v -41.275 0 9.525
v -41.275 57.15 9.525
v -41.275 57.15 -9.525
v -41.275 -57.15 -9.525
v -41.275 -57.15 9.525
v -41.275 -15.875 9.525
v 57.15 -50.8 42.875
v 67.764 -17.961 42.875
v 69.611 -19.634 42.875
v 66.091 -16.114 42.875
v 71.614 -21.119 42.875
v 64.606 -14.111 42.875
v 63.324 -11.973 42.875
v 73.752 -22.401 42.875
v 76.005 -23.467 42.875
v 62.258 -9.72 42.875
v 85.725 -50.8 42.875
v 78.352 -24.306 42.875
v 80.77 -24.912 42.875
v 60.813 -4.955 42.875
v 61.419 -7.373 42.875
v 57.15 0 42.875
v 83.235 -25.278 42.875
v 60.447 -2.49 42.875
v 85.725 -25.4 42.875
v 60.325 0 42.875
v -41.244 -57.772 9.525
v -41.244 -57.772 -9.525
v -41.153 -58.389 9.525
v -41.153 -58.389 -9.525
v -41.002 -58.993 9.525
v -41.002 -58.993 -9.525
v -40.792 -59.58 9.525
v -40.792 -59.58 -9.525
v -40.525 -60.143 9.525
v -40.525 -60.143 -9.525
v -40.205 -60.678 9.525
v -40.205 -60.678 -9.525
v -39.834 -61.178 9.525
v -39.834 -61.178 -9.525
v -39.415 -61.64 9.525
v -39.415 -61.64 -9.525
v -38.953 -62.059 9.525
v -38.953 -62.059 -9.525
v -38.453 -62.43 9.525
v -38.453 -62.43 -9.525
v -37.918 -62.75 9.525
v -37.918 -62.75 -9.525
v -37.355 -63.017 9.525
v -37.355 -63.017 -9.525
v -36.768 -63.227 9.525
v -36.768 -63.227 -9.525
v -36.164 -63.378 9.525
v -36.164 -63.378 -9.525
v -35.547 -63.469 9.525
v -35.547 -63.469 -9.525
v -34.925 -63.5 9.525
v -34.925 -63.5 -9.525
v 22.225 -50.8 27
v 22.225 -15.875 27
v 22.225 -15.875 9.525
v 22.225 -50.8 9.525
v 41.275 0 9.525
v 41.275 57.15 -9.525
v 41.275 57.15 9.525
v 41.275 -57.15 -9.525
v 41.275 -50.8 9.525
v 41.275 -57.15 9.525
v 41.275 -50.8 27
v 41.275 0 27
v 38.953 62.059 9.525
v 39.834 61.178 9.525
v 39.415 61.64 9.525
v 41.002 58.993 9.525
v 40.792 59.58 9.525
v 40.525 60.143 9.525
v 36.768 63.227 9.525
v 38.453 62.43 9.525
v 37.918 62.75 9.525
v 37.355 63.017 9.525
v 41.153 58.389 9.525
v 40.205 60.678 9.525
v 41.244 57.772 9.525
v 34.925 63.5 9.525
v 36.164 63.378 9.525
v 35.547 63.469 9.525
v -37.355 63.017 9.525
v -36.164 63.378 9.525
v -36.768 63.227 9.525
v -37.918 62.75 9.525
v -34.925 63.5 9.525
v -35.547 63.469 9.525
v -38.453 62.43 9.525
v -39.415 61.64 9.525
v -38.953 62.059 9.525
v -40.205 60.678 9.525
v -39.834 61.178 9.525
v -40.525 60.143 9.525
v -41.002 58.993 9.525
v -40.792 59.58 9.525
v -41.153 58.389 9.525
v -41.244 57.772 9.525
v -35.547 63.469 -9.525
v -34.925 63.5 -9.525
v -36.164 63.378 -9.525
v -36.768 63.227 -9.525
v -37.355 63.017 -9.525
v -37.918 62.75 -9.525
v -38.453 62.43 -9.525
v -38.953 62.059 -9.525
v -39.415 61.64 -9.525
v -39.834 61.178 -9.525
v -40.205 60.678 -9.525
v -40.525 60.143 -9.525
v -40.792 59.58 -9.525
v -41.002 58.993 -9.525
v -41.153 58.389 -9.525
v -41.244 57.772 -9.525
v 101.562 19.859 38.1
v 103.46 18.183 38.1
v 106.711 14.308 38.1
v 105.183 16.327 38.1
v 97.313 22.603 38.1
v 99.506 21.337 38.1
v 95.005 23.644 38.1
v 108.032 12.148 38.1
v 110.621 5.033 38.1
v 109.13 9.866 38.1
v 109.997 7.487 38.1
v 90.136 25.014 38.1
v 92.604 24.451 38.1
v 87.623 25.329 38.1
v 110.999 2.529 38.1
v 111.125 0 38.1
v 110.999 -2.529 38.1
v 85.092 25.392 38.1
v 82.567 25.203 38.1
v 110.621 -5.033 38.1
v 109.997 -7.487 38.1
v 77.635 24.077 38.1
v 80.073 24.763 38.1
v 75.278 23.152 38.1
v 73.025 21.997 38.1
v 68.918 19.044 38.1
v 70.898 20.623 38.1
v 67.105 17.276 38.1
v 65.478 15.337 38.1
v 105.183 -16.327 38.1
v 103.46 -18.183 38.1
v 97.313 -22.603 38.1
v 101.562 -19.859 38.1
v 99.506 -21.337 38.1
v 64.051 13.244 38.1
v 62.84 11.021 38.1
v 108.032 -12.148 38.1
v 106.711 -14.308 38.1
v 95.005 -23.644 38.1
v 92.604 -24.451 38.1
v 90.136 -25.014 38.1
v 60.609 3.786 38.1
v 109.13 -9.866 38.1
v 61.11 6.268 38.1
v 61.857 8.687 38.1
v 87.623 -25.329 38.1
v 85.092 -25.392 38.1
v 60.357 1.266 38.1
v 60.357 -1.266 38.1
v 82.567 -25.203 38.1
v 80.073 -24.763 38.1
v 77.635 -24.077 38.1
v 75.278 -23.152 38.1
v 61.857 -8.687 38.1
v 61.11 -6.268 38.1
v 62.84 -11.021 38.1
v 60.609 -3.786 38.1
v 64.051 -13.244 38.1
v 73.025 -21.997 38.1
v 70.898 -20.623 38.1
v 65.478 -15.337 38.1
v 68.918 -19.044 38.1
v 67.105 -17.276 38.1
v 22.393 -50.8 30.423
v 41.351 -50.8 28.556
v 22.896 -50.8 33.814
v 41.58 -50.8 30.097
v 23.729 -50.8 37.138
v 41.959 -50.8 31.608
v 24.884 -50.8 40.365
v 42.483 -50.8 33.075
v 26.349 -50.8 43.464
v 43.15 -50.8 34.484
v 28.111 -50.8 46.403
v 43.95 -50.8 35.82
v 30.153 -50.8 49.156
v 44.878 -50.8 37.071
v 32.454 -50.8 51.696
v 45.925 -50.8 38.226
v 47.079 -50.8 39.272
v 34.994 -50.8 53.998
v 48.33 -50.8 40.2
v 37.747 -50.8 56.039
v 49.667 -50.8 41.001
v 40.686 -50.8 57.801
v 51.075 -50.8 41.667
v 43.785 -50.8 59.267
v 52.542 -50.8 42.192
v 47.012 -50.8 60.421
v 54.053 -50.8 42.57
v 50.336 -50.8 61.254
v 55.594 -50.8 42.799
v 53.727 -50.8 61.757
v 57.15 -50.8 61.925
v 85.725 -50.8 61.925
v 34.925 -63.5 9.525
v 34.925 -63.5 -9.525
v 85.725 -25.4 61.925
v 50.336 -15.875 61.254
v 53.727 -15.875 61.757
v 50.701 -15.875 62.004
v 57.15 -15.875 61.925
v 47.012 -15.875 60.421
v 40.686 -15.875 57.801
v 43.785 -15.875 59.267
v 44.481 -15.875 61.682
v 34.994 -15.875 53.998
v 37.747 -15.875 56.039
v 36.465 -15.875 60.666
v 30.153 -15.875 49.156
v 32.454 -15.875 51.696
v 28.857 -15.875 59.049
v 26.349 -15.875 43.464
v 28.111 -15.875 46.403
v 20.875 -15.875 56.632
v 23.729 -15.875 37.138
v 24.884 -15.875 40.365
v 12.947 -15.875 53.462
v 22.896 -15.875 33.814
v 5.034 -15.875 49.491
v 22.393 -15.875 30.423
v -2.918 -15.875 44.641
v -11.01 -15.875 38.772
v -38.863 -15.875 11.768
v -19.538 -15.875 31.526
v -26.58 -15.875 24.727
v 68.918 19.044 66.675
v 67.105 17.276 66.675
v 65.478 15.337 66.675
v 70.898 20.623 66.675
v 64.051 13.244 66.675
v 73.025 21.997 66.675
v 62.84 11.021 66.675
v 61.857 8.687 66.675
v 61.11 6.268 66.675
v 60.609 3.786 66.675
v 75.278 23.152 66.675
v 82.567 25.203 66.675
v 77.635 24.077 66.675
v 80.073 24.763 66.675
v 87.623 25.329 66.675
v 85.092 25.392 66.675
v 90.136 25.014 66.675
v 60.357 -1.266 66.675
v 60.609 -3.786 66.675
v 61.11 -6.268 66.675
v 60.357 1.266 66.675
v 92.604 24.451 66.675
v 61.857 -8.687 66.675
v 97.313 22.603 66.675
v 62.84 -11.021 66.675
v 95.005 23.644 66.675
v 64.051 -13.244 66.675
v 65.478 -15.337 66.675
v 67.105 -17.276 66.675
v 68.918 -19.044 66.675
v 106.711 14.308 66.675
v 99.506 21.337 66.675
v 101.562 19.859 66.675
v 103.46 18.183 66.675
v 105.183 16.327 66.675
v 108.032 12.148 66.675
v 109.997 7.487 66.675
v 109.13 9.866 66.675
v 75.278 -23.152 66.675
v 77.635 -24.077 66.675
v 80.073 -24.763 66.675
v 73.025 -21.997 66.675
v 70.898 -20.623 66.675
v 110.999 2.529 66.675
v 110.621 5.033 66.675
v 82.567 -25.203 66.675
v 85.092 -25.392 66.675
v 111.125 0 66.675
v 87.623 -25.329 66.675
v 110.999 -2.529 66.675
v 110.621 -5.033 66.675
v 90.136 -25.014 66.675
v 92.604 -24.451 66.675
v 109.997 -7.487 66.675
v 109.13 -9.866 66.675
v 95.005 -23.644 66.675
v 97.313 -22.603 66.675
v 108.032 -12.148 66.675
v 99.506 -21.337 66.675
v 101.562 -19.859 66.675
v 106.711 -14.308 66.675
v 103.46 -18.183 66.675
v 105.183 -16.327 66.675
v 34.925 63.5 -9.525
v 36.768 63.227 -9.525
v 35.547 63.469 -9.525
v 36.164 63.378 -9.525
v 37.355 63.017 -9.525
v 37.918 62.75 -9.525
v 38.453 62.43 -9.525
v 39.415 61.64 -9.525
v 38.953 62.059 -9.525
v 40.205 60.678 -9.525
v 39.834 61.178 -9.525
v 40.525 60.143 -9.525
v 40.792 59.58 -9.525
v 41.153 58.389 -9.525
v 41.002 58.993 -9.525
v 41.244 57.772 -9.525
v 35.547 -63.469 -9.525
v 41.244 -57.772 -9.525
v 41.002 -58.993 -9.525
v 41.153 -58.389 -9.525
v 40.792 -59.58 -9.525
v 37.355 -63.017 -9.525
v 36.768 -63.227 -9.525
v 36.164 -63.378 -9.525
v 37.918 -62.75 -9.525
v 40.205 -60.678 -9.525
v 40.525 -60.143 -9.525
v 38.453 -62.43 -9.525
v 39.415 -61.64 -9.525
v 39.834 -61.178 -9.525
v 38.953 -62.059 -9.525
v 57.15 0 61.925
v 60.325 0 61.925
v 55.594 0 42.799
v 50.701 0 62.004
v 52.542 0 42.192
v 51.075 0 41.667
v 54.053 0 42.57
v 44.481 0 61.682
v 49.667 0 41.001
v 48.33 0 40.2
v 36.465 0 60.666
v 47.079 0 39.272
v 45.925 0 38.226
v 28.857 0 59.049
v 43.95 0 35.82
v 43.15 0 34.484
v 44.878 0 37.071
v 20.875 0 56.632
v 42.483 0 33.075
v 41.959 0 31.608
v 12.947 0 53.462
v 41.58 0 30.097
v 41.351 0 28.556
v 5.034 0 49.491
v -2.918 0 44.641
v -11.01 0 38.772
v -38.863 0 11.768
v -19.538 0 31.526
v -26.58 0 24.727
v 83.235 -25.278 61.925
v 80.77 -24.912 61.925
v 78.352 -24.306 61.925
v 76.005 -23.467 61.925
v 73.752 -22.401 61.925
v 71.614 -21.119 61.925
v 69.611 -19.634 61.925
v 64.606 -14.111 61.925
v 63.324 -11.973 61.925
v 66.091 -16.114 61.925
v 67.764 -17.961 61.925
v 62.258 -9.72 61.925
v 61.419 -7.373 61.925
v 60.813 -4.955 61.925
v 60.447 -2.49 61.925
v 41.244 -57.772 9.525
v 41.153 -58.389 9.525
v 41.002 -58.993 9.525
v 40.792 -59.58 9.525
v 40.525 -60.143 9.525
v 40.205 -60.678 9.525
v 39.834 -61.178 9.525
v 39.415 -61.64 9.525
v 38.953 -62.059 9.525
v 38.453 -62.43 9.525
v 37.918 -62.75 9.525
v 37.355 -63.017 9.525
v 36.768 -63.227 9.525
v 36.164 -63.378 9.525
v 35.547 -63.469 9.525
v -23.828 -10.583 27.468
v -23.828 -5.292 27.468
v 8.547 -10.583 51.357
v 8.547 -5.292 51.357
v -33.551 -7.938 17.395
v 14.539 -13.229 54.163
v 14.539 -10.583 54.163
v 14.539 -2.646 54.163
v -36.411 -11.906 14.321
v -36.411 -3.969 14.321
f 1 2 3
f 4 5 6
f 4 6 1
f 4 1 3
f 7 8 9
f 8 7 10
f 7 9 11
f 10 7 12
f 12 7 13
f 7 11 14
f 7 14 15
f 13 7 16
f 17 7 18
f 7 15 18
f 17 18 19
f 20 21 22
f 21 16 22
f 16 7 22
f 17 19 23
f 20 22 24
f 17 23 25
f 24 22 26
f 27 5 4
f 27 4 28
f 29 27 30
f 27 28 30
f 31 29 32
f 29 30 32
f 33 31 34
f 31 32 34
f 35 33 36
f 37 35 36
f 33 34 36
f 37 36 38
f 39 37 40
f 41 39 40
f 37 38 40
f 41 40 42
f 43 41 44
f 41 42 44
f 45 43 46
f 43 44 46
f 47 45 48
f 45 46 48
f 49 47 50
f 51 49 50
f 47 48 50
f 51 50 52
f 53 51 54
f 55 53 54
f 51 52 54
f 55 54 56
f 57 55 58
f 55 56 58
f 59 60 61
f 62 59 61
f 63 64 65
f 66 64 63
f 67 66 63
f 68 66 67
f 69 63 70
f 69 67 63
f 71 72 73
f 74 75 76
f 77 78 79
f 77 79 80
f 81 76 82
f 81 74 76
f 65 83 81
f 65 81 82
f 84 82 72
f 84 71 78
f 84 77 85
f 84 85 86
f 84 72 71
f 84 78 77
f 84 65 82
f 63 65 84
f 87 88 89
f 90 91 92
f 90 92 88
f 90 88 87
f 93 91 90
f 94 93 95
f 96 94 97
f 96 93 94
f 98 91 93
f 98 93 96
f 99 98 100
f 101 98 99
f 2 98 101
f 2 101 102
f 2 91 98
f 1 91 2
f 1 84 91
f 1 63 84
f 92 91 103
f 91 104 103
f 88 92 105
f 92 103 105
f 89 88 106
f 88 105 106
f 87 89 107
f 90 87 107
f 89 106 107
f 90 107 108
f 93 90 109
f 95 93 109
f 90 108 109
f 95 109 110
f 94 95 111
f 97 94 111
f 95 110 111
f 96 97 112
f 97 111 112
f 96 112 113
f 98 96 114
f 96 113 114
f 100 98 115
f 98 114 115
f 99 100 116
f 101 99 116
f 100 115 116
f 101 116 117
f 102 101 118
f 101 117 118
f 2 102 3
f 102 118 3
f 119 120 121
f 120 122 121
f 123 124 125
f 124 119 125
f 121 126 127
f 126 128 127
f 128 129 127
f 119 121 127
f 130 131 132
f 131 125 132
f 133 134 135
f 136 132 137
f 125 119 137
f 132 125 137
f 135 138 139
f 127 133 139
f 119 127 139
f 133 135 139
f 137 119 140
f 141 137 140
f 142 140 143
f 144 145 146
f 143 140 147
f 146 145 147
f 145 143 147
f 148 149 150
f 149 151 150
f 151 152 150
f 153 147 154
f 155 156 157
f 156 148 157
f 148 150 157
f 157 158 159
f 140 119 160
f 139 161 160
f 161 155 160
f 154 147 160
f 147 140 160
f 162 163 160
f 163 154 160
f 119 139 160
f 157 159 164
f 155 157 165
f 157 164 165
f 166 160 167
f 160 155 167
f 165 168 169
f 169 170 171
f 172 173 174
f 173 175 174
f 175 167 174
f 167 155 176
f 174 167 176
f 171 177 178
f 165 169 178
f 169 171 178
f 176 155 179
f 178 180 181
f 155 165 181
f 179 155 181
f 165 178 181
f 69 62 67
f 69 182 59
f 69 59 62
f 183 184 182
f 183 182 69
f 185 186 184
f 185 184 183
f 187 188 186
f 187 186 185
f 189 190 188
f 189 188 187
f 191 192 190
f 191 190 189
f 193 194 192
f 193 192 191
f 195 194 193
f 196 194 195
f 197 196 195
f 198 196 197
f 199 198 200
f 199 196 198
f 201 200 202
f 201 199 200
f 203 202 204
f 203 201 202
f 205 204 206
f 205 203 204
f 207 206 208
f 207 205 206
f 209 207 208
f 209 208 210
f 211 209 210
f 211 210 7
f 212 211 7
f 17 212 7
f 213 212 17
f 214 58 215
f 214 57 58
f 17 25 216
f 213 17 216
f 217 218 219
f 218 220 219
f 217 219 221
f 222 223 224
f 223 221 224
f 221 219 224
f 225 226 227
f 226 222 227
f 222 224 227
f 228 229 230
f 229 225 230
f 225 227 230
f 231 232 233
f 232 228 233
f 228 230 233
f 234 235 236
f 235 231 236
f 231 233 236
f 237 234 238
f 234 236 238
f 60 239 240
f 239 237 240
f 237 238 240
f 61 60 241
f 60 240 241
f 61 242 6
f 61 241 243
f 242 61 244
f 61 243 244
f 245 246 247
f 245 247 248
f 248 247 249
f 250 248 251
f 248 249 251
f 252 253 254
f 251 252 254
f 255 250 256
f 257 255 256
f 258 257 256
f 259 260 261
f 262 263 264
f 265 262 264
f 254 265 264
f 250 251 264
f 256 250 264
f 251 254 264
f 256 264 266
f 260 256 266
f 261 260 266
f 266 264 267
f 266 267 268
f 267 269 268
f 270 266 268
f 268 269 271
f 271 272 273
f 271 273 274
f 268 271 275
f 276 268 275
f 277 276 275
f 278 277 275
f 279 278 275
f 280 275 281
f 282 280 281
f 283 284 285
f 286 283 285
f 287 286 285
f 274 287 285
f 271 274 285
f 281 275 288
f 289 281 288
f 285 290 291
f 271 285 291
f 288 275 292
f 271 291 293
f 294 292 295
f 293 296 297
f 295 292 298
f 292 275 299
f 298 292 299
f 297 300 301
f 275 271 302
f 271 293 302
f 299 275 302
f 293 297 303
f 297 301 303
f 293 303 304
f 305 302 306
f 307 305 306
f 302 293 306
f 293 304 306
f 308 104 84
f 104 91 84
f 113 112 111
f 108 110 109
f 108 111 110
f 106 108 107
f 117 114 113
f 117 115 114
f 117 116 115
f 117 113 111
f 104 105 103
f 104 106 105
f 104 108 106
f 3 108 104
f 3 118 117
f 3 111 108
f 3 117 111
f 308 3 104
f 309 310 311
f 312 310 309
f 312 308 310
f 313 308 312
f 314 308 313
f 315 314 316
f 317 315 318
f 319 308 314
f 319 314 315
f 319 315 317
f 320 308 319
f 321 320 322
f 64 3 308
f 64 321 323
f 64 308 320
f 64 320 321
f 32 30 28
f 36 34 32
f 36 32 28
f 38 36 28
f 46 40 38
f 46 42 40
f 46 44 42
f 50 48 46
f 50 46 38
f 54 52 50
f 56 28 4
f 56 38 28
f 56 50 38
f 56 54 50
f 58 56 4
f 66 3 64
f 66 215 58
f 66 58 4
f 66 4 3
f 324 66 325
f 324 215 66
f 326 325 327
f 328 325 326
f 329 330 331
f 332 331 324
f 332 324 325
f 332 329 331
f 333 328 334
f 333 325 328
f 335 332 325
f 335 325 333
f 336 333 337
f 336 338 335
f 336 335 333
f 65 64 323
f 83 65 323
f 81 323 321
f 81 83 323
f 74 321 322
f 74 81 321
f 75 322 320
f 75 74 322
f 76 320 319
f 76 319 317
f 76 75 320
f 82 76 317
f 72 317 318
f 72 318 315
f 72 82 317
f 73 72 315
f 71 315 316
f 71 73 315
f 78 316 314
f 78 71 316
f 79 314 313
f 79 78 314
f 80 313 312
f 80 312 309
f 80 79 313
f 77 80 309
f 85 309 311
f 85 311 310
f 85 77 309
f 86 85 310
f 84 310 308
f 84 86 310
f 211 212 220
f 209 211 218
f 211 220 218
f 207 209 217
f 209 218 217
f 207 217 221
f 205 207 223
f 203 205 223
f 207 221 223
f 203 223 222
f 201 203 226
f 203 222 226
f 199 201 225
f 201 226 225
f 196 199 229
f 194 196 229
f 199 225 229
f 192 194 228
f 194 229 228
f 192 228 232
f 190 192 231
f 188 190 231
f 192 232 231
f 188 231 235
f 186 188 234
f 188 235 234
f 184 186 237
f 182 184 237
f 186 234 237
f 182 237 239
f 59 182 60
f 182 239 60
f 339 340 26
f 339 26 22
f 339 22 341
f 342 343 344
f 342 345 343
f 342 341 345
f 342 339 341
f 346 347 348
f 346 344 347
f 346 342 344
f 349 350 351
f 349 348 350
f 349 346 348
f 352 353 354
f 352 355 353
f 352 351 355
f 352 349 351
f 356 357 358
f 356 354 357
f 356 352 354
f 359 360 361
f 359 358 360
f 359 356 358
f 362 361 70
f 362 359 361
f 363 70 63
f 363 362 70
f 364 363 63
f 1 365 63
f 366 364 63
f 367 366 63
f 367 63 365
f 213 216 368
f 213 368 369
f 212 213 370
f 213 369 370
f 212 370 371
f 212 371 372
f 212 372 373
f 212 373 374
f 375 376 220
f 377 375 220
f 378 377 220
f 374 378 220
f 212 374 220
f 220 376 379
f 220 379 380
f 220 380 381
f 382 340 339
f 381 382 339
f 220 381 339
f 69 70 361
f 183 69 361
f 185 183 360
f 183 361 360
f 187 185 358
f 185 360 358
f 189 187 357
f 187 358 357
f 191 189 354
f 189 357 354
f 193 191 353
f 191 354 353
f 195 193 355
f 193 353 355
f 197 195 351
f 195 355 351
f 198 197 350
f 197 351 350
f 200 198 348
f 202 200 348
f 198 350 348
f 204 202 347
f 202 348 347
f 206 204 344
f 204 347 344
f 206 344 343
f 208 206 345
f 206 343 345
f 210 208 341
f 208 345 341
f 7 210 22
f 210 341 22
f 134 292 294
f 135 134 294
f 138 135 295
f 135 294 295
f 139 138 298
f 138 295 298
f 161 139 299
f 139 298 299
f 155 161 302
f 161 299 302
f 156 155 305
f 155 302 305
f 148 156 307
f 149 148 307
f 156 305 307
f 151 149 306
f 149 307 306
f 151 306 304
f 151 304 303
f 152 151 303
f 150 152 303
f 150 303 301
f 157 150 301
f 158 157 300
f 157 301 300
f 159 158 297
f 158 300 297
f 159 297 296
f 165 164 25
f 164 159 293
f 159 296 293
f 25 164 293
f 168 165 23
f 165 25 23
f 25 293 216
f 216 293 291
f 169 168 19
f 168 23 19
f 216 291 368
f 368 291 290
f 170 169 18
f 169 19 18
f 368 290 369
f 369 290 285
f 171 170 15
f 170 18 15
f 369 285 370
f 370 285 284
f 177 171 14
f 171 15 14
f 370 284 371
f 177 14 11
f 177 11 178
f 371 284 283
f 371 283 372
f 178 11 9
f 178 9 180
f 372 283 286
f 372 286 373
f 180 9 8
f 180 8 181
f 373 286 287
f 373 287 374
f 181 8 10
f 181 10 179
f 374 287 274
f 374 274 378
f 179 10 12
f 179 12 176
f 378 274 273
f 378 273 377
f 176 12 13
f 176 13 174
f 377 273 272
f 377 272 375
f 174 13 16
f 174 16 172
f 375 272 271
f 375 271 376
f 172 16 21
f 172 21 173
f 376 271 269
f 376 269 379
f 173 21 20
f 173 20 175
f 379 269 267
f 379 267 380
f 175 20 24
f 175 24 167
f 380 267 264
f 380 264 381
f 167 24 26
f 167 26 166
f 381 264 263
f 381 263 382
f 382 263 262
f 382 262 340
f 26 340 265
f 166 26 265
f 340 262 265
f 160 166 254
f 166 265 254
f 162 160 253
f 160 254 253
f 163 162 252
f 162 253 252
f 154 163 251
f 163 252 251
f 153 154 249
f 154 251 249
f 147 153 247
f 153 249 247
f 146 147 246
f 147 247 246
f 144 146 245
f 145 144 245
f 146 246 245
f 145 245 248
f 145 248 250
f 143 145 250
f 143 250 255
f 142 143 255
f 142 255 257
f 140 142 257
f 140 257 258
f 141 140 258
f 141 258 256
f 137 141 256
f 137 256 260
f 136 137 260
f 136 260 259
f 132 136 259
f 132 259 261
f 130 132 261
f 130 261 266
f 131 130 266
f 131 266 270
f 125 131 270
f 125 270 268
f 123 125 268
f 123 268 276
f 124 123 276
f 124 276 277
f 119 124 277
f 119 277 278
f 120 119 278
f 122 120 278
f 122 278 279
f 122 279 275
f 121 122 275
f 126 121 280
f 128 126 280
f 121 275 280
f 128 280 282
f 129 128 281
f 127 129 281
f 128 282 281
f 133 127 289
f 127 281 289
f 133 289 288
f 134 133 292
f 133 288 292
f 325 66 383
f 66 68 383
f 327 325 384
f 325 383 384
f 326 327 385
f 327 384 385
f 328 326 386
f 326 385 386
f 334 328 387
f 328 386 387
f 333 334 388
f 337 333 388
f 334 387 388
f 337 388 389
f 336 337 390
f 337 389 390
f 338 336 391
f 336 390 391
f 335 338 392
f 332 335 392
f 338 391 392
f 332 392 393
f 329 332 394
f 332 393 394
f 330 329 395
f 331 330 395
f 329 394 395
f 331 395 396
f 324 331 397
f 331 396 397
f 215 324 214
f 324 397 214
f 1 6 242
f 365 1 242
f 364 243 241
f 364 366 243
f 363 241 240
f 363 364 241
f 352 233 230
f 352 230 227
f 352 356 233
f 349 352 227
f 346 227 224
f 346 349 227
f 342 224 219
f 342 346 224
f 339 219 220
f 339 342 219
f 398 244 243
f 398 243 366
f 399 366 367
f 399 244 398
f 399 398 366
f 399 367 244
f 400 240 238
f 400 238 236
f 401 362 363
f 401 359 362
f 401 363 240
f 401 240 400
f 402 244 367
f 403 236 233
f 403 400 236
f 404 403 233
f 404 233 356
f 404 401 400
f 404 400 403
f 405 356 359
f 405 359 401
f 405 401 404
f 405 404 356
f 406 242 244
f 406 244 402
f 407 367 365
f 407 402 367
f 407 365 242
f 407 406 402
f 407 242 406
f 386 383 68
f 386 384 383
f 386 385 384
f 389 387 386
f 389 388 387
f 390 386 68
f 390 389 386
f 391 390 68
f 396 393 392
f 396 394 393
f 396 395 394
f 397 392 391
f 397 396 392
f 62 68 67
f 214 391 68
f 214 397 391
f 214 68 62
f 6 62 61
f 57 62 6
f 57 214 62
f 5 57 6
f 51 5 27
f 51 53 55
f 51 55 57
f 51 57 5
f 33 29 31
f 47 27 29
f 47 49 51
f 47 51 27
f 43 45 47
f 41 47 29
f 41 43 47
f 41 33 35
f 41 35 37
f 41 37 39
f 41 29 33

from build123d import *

# Parameters (mm, degrees)
F1_DEPTH = 63.5
F0_W     = 25.4
F0_H     = 19.05
F2_DEPTH = 50.8
F3_DEPTH = 15.875
F5_R     = 6.35


with BuildPart() as f1:
    # F0 (on Front) → F1 (new body, symmetric)
    with BuildSketch(Plane.XZ):
        Polygon((-41.275, -9.525), (41.275, -9.525), (41.275, 9.525), (22.225, 9.525), (-41.275, 9.525), align=None)
    extrude(amount=F1_DEPTH, both=True)

    # F0 (on Front) → F2 (join)
    with BuildSketch(Plane.XZ):
        with BuildLine():
            Line((22.225, 9.525), (41.275, 9.525))
            Line((41.275, 9.525), (41.275, 27.0002))
            ThreePointArc((41.275, 27.0002), (45.92468, 38.22552), (57.15, 42.8752))
            Line((57.15, 42.8752), (60.325, 42.8752))
            Line((60.325, 42.8752), (60.325, 61.9252))
            Line((60.325, 61.9252), (57.15, 61.9252))
            ThreePointArc((57.15, 61.9252), (32.454296, 51.695904), (22.225, 27.0002))
            Line((22.225, 27.0002), (22.225, 9.525))
        make_face()
        with Locations((73.025, 52.4002)):
            Rectangle(F0_W, F0_H)
    extrude(amount=F2_DEPTH)

    # F0 (on Front) → F3 (join)
    with BuildSketch(Plane.XZ):
        with BuildLine():
            add(Edge.make_bspline(
                [(-41.275, 9.525), (-30.858979, 18.073546), (0, 64.438261), (57.15, 61.9252)],
                knots=[0, 0, 0, 0, 111.504536, 111.504536, 111.504536, 111.504536], degree=3))
            Line((-41.275, 9.525), (22.225, 9.525))
            Line((22.225, 9.525), (22.225, 27.0002))
            ThreePointArc((22.225, 27.0002), (32.454296, 51.695904), (57.15, 61.9252))
        make_face()
    extrude(amount=F3_DEPTH)

    # F0 (on Front) → F4 (revolve)
    with BuildSketch(Plane.XZ):
        Polygon((85.725, 66.675), (85.725, 61.9252), (85.725, 42.8752), (85.725, 38.1), (111.125, 38.1), (111.125, 66.675), align=None)
    revolve(axis=Axis((85.725, 0, 52.3875), (0, 0, -1)))

    # F5
    f5_edges = [f1.edges().sort_by_distance(p)[0] for p in [
        (-41.275, -63.5, 0),
        (41.275, -63.5, 0),
        (-41.275, 63.5, 0),
        (41.275, 63.5, 0),
    ]]
    fillet(f5_edges, radius=F5_R)


solid = f1.part
